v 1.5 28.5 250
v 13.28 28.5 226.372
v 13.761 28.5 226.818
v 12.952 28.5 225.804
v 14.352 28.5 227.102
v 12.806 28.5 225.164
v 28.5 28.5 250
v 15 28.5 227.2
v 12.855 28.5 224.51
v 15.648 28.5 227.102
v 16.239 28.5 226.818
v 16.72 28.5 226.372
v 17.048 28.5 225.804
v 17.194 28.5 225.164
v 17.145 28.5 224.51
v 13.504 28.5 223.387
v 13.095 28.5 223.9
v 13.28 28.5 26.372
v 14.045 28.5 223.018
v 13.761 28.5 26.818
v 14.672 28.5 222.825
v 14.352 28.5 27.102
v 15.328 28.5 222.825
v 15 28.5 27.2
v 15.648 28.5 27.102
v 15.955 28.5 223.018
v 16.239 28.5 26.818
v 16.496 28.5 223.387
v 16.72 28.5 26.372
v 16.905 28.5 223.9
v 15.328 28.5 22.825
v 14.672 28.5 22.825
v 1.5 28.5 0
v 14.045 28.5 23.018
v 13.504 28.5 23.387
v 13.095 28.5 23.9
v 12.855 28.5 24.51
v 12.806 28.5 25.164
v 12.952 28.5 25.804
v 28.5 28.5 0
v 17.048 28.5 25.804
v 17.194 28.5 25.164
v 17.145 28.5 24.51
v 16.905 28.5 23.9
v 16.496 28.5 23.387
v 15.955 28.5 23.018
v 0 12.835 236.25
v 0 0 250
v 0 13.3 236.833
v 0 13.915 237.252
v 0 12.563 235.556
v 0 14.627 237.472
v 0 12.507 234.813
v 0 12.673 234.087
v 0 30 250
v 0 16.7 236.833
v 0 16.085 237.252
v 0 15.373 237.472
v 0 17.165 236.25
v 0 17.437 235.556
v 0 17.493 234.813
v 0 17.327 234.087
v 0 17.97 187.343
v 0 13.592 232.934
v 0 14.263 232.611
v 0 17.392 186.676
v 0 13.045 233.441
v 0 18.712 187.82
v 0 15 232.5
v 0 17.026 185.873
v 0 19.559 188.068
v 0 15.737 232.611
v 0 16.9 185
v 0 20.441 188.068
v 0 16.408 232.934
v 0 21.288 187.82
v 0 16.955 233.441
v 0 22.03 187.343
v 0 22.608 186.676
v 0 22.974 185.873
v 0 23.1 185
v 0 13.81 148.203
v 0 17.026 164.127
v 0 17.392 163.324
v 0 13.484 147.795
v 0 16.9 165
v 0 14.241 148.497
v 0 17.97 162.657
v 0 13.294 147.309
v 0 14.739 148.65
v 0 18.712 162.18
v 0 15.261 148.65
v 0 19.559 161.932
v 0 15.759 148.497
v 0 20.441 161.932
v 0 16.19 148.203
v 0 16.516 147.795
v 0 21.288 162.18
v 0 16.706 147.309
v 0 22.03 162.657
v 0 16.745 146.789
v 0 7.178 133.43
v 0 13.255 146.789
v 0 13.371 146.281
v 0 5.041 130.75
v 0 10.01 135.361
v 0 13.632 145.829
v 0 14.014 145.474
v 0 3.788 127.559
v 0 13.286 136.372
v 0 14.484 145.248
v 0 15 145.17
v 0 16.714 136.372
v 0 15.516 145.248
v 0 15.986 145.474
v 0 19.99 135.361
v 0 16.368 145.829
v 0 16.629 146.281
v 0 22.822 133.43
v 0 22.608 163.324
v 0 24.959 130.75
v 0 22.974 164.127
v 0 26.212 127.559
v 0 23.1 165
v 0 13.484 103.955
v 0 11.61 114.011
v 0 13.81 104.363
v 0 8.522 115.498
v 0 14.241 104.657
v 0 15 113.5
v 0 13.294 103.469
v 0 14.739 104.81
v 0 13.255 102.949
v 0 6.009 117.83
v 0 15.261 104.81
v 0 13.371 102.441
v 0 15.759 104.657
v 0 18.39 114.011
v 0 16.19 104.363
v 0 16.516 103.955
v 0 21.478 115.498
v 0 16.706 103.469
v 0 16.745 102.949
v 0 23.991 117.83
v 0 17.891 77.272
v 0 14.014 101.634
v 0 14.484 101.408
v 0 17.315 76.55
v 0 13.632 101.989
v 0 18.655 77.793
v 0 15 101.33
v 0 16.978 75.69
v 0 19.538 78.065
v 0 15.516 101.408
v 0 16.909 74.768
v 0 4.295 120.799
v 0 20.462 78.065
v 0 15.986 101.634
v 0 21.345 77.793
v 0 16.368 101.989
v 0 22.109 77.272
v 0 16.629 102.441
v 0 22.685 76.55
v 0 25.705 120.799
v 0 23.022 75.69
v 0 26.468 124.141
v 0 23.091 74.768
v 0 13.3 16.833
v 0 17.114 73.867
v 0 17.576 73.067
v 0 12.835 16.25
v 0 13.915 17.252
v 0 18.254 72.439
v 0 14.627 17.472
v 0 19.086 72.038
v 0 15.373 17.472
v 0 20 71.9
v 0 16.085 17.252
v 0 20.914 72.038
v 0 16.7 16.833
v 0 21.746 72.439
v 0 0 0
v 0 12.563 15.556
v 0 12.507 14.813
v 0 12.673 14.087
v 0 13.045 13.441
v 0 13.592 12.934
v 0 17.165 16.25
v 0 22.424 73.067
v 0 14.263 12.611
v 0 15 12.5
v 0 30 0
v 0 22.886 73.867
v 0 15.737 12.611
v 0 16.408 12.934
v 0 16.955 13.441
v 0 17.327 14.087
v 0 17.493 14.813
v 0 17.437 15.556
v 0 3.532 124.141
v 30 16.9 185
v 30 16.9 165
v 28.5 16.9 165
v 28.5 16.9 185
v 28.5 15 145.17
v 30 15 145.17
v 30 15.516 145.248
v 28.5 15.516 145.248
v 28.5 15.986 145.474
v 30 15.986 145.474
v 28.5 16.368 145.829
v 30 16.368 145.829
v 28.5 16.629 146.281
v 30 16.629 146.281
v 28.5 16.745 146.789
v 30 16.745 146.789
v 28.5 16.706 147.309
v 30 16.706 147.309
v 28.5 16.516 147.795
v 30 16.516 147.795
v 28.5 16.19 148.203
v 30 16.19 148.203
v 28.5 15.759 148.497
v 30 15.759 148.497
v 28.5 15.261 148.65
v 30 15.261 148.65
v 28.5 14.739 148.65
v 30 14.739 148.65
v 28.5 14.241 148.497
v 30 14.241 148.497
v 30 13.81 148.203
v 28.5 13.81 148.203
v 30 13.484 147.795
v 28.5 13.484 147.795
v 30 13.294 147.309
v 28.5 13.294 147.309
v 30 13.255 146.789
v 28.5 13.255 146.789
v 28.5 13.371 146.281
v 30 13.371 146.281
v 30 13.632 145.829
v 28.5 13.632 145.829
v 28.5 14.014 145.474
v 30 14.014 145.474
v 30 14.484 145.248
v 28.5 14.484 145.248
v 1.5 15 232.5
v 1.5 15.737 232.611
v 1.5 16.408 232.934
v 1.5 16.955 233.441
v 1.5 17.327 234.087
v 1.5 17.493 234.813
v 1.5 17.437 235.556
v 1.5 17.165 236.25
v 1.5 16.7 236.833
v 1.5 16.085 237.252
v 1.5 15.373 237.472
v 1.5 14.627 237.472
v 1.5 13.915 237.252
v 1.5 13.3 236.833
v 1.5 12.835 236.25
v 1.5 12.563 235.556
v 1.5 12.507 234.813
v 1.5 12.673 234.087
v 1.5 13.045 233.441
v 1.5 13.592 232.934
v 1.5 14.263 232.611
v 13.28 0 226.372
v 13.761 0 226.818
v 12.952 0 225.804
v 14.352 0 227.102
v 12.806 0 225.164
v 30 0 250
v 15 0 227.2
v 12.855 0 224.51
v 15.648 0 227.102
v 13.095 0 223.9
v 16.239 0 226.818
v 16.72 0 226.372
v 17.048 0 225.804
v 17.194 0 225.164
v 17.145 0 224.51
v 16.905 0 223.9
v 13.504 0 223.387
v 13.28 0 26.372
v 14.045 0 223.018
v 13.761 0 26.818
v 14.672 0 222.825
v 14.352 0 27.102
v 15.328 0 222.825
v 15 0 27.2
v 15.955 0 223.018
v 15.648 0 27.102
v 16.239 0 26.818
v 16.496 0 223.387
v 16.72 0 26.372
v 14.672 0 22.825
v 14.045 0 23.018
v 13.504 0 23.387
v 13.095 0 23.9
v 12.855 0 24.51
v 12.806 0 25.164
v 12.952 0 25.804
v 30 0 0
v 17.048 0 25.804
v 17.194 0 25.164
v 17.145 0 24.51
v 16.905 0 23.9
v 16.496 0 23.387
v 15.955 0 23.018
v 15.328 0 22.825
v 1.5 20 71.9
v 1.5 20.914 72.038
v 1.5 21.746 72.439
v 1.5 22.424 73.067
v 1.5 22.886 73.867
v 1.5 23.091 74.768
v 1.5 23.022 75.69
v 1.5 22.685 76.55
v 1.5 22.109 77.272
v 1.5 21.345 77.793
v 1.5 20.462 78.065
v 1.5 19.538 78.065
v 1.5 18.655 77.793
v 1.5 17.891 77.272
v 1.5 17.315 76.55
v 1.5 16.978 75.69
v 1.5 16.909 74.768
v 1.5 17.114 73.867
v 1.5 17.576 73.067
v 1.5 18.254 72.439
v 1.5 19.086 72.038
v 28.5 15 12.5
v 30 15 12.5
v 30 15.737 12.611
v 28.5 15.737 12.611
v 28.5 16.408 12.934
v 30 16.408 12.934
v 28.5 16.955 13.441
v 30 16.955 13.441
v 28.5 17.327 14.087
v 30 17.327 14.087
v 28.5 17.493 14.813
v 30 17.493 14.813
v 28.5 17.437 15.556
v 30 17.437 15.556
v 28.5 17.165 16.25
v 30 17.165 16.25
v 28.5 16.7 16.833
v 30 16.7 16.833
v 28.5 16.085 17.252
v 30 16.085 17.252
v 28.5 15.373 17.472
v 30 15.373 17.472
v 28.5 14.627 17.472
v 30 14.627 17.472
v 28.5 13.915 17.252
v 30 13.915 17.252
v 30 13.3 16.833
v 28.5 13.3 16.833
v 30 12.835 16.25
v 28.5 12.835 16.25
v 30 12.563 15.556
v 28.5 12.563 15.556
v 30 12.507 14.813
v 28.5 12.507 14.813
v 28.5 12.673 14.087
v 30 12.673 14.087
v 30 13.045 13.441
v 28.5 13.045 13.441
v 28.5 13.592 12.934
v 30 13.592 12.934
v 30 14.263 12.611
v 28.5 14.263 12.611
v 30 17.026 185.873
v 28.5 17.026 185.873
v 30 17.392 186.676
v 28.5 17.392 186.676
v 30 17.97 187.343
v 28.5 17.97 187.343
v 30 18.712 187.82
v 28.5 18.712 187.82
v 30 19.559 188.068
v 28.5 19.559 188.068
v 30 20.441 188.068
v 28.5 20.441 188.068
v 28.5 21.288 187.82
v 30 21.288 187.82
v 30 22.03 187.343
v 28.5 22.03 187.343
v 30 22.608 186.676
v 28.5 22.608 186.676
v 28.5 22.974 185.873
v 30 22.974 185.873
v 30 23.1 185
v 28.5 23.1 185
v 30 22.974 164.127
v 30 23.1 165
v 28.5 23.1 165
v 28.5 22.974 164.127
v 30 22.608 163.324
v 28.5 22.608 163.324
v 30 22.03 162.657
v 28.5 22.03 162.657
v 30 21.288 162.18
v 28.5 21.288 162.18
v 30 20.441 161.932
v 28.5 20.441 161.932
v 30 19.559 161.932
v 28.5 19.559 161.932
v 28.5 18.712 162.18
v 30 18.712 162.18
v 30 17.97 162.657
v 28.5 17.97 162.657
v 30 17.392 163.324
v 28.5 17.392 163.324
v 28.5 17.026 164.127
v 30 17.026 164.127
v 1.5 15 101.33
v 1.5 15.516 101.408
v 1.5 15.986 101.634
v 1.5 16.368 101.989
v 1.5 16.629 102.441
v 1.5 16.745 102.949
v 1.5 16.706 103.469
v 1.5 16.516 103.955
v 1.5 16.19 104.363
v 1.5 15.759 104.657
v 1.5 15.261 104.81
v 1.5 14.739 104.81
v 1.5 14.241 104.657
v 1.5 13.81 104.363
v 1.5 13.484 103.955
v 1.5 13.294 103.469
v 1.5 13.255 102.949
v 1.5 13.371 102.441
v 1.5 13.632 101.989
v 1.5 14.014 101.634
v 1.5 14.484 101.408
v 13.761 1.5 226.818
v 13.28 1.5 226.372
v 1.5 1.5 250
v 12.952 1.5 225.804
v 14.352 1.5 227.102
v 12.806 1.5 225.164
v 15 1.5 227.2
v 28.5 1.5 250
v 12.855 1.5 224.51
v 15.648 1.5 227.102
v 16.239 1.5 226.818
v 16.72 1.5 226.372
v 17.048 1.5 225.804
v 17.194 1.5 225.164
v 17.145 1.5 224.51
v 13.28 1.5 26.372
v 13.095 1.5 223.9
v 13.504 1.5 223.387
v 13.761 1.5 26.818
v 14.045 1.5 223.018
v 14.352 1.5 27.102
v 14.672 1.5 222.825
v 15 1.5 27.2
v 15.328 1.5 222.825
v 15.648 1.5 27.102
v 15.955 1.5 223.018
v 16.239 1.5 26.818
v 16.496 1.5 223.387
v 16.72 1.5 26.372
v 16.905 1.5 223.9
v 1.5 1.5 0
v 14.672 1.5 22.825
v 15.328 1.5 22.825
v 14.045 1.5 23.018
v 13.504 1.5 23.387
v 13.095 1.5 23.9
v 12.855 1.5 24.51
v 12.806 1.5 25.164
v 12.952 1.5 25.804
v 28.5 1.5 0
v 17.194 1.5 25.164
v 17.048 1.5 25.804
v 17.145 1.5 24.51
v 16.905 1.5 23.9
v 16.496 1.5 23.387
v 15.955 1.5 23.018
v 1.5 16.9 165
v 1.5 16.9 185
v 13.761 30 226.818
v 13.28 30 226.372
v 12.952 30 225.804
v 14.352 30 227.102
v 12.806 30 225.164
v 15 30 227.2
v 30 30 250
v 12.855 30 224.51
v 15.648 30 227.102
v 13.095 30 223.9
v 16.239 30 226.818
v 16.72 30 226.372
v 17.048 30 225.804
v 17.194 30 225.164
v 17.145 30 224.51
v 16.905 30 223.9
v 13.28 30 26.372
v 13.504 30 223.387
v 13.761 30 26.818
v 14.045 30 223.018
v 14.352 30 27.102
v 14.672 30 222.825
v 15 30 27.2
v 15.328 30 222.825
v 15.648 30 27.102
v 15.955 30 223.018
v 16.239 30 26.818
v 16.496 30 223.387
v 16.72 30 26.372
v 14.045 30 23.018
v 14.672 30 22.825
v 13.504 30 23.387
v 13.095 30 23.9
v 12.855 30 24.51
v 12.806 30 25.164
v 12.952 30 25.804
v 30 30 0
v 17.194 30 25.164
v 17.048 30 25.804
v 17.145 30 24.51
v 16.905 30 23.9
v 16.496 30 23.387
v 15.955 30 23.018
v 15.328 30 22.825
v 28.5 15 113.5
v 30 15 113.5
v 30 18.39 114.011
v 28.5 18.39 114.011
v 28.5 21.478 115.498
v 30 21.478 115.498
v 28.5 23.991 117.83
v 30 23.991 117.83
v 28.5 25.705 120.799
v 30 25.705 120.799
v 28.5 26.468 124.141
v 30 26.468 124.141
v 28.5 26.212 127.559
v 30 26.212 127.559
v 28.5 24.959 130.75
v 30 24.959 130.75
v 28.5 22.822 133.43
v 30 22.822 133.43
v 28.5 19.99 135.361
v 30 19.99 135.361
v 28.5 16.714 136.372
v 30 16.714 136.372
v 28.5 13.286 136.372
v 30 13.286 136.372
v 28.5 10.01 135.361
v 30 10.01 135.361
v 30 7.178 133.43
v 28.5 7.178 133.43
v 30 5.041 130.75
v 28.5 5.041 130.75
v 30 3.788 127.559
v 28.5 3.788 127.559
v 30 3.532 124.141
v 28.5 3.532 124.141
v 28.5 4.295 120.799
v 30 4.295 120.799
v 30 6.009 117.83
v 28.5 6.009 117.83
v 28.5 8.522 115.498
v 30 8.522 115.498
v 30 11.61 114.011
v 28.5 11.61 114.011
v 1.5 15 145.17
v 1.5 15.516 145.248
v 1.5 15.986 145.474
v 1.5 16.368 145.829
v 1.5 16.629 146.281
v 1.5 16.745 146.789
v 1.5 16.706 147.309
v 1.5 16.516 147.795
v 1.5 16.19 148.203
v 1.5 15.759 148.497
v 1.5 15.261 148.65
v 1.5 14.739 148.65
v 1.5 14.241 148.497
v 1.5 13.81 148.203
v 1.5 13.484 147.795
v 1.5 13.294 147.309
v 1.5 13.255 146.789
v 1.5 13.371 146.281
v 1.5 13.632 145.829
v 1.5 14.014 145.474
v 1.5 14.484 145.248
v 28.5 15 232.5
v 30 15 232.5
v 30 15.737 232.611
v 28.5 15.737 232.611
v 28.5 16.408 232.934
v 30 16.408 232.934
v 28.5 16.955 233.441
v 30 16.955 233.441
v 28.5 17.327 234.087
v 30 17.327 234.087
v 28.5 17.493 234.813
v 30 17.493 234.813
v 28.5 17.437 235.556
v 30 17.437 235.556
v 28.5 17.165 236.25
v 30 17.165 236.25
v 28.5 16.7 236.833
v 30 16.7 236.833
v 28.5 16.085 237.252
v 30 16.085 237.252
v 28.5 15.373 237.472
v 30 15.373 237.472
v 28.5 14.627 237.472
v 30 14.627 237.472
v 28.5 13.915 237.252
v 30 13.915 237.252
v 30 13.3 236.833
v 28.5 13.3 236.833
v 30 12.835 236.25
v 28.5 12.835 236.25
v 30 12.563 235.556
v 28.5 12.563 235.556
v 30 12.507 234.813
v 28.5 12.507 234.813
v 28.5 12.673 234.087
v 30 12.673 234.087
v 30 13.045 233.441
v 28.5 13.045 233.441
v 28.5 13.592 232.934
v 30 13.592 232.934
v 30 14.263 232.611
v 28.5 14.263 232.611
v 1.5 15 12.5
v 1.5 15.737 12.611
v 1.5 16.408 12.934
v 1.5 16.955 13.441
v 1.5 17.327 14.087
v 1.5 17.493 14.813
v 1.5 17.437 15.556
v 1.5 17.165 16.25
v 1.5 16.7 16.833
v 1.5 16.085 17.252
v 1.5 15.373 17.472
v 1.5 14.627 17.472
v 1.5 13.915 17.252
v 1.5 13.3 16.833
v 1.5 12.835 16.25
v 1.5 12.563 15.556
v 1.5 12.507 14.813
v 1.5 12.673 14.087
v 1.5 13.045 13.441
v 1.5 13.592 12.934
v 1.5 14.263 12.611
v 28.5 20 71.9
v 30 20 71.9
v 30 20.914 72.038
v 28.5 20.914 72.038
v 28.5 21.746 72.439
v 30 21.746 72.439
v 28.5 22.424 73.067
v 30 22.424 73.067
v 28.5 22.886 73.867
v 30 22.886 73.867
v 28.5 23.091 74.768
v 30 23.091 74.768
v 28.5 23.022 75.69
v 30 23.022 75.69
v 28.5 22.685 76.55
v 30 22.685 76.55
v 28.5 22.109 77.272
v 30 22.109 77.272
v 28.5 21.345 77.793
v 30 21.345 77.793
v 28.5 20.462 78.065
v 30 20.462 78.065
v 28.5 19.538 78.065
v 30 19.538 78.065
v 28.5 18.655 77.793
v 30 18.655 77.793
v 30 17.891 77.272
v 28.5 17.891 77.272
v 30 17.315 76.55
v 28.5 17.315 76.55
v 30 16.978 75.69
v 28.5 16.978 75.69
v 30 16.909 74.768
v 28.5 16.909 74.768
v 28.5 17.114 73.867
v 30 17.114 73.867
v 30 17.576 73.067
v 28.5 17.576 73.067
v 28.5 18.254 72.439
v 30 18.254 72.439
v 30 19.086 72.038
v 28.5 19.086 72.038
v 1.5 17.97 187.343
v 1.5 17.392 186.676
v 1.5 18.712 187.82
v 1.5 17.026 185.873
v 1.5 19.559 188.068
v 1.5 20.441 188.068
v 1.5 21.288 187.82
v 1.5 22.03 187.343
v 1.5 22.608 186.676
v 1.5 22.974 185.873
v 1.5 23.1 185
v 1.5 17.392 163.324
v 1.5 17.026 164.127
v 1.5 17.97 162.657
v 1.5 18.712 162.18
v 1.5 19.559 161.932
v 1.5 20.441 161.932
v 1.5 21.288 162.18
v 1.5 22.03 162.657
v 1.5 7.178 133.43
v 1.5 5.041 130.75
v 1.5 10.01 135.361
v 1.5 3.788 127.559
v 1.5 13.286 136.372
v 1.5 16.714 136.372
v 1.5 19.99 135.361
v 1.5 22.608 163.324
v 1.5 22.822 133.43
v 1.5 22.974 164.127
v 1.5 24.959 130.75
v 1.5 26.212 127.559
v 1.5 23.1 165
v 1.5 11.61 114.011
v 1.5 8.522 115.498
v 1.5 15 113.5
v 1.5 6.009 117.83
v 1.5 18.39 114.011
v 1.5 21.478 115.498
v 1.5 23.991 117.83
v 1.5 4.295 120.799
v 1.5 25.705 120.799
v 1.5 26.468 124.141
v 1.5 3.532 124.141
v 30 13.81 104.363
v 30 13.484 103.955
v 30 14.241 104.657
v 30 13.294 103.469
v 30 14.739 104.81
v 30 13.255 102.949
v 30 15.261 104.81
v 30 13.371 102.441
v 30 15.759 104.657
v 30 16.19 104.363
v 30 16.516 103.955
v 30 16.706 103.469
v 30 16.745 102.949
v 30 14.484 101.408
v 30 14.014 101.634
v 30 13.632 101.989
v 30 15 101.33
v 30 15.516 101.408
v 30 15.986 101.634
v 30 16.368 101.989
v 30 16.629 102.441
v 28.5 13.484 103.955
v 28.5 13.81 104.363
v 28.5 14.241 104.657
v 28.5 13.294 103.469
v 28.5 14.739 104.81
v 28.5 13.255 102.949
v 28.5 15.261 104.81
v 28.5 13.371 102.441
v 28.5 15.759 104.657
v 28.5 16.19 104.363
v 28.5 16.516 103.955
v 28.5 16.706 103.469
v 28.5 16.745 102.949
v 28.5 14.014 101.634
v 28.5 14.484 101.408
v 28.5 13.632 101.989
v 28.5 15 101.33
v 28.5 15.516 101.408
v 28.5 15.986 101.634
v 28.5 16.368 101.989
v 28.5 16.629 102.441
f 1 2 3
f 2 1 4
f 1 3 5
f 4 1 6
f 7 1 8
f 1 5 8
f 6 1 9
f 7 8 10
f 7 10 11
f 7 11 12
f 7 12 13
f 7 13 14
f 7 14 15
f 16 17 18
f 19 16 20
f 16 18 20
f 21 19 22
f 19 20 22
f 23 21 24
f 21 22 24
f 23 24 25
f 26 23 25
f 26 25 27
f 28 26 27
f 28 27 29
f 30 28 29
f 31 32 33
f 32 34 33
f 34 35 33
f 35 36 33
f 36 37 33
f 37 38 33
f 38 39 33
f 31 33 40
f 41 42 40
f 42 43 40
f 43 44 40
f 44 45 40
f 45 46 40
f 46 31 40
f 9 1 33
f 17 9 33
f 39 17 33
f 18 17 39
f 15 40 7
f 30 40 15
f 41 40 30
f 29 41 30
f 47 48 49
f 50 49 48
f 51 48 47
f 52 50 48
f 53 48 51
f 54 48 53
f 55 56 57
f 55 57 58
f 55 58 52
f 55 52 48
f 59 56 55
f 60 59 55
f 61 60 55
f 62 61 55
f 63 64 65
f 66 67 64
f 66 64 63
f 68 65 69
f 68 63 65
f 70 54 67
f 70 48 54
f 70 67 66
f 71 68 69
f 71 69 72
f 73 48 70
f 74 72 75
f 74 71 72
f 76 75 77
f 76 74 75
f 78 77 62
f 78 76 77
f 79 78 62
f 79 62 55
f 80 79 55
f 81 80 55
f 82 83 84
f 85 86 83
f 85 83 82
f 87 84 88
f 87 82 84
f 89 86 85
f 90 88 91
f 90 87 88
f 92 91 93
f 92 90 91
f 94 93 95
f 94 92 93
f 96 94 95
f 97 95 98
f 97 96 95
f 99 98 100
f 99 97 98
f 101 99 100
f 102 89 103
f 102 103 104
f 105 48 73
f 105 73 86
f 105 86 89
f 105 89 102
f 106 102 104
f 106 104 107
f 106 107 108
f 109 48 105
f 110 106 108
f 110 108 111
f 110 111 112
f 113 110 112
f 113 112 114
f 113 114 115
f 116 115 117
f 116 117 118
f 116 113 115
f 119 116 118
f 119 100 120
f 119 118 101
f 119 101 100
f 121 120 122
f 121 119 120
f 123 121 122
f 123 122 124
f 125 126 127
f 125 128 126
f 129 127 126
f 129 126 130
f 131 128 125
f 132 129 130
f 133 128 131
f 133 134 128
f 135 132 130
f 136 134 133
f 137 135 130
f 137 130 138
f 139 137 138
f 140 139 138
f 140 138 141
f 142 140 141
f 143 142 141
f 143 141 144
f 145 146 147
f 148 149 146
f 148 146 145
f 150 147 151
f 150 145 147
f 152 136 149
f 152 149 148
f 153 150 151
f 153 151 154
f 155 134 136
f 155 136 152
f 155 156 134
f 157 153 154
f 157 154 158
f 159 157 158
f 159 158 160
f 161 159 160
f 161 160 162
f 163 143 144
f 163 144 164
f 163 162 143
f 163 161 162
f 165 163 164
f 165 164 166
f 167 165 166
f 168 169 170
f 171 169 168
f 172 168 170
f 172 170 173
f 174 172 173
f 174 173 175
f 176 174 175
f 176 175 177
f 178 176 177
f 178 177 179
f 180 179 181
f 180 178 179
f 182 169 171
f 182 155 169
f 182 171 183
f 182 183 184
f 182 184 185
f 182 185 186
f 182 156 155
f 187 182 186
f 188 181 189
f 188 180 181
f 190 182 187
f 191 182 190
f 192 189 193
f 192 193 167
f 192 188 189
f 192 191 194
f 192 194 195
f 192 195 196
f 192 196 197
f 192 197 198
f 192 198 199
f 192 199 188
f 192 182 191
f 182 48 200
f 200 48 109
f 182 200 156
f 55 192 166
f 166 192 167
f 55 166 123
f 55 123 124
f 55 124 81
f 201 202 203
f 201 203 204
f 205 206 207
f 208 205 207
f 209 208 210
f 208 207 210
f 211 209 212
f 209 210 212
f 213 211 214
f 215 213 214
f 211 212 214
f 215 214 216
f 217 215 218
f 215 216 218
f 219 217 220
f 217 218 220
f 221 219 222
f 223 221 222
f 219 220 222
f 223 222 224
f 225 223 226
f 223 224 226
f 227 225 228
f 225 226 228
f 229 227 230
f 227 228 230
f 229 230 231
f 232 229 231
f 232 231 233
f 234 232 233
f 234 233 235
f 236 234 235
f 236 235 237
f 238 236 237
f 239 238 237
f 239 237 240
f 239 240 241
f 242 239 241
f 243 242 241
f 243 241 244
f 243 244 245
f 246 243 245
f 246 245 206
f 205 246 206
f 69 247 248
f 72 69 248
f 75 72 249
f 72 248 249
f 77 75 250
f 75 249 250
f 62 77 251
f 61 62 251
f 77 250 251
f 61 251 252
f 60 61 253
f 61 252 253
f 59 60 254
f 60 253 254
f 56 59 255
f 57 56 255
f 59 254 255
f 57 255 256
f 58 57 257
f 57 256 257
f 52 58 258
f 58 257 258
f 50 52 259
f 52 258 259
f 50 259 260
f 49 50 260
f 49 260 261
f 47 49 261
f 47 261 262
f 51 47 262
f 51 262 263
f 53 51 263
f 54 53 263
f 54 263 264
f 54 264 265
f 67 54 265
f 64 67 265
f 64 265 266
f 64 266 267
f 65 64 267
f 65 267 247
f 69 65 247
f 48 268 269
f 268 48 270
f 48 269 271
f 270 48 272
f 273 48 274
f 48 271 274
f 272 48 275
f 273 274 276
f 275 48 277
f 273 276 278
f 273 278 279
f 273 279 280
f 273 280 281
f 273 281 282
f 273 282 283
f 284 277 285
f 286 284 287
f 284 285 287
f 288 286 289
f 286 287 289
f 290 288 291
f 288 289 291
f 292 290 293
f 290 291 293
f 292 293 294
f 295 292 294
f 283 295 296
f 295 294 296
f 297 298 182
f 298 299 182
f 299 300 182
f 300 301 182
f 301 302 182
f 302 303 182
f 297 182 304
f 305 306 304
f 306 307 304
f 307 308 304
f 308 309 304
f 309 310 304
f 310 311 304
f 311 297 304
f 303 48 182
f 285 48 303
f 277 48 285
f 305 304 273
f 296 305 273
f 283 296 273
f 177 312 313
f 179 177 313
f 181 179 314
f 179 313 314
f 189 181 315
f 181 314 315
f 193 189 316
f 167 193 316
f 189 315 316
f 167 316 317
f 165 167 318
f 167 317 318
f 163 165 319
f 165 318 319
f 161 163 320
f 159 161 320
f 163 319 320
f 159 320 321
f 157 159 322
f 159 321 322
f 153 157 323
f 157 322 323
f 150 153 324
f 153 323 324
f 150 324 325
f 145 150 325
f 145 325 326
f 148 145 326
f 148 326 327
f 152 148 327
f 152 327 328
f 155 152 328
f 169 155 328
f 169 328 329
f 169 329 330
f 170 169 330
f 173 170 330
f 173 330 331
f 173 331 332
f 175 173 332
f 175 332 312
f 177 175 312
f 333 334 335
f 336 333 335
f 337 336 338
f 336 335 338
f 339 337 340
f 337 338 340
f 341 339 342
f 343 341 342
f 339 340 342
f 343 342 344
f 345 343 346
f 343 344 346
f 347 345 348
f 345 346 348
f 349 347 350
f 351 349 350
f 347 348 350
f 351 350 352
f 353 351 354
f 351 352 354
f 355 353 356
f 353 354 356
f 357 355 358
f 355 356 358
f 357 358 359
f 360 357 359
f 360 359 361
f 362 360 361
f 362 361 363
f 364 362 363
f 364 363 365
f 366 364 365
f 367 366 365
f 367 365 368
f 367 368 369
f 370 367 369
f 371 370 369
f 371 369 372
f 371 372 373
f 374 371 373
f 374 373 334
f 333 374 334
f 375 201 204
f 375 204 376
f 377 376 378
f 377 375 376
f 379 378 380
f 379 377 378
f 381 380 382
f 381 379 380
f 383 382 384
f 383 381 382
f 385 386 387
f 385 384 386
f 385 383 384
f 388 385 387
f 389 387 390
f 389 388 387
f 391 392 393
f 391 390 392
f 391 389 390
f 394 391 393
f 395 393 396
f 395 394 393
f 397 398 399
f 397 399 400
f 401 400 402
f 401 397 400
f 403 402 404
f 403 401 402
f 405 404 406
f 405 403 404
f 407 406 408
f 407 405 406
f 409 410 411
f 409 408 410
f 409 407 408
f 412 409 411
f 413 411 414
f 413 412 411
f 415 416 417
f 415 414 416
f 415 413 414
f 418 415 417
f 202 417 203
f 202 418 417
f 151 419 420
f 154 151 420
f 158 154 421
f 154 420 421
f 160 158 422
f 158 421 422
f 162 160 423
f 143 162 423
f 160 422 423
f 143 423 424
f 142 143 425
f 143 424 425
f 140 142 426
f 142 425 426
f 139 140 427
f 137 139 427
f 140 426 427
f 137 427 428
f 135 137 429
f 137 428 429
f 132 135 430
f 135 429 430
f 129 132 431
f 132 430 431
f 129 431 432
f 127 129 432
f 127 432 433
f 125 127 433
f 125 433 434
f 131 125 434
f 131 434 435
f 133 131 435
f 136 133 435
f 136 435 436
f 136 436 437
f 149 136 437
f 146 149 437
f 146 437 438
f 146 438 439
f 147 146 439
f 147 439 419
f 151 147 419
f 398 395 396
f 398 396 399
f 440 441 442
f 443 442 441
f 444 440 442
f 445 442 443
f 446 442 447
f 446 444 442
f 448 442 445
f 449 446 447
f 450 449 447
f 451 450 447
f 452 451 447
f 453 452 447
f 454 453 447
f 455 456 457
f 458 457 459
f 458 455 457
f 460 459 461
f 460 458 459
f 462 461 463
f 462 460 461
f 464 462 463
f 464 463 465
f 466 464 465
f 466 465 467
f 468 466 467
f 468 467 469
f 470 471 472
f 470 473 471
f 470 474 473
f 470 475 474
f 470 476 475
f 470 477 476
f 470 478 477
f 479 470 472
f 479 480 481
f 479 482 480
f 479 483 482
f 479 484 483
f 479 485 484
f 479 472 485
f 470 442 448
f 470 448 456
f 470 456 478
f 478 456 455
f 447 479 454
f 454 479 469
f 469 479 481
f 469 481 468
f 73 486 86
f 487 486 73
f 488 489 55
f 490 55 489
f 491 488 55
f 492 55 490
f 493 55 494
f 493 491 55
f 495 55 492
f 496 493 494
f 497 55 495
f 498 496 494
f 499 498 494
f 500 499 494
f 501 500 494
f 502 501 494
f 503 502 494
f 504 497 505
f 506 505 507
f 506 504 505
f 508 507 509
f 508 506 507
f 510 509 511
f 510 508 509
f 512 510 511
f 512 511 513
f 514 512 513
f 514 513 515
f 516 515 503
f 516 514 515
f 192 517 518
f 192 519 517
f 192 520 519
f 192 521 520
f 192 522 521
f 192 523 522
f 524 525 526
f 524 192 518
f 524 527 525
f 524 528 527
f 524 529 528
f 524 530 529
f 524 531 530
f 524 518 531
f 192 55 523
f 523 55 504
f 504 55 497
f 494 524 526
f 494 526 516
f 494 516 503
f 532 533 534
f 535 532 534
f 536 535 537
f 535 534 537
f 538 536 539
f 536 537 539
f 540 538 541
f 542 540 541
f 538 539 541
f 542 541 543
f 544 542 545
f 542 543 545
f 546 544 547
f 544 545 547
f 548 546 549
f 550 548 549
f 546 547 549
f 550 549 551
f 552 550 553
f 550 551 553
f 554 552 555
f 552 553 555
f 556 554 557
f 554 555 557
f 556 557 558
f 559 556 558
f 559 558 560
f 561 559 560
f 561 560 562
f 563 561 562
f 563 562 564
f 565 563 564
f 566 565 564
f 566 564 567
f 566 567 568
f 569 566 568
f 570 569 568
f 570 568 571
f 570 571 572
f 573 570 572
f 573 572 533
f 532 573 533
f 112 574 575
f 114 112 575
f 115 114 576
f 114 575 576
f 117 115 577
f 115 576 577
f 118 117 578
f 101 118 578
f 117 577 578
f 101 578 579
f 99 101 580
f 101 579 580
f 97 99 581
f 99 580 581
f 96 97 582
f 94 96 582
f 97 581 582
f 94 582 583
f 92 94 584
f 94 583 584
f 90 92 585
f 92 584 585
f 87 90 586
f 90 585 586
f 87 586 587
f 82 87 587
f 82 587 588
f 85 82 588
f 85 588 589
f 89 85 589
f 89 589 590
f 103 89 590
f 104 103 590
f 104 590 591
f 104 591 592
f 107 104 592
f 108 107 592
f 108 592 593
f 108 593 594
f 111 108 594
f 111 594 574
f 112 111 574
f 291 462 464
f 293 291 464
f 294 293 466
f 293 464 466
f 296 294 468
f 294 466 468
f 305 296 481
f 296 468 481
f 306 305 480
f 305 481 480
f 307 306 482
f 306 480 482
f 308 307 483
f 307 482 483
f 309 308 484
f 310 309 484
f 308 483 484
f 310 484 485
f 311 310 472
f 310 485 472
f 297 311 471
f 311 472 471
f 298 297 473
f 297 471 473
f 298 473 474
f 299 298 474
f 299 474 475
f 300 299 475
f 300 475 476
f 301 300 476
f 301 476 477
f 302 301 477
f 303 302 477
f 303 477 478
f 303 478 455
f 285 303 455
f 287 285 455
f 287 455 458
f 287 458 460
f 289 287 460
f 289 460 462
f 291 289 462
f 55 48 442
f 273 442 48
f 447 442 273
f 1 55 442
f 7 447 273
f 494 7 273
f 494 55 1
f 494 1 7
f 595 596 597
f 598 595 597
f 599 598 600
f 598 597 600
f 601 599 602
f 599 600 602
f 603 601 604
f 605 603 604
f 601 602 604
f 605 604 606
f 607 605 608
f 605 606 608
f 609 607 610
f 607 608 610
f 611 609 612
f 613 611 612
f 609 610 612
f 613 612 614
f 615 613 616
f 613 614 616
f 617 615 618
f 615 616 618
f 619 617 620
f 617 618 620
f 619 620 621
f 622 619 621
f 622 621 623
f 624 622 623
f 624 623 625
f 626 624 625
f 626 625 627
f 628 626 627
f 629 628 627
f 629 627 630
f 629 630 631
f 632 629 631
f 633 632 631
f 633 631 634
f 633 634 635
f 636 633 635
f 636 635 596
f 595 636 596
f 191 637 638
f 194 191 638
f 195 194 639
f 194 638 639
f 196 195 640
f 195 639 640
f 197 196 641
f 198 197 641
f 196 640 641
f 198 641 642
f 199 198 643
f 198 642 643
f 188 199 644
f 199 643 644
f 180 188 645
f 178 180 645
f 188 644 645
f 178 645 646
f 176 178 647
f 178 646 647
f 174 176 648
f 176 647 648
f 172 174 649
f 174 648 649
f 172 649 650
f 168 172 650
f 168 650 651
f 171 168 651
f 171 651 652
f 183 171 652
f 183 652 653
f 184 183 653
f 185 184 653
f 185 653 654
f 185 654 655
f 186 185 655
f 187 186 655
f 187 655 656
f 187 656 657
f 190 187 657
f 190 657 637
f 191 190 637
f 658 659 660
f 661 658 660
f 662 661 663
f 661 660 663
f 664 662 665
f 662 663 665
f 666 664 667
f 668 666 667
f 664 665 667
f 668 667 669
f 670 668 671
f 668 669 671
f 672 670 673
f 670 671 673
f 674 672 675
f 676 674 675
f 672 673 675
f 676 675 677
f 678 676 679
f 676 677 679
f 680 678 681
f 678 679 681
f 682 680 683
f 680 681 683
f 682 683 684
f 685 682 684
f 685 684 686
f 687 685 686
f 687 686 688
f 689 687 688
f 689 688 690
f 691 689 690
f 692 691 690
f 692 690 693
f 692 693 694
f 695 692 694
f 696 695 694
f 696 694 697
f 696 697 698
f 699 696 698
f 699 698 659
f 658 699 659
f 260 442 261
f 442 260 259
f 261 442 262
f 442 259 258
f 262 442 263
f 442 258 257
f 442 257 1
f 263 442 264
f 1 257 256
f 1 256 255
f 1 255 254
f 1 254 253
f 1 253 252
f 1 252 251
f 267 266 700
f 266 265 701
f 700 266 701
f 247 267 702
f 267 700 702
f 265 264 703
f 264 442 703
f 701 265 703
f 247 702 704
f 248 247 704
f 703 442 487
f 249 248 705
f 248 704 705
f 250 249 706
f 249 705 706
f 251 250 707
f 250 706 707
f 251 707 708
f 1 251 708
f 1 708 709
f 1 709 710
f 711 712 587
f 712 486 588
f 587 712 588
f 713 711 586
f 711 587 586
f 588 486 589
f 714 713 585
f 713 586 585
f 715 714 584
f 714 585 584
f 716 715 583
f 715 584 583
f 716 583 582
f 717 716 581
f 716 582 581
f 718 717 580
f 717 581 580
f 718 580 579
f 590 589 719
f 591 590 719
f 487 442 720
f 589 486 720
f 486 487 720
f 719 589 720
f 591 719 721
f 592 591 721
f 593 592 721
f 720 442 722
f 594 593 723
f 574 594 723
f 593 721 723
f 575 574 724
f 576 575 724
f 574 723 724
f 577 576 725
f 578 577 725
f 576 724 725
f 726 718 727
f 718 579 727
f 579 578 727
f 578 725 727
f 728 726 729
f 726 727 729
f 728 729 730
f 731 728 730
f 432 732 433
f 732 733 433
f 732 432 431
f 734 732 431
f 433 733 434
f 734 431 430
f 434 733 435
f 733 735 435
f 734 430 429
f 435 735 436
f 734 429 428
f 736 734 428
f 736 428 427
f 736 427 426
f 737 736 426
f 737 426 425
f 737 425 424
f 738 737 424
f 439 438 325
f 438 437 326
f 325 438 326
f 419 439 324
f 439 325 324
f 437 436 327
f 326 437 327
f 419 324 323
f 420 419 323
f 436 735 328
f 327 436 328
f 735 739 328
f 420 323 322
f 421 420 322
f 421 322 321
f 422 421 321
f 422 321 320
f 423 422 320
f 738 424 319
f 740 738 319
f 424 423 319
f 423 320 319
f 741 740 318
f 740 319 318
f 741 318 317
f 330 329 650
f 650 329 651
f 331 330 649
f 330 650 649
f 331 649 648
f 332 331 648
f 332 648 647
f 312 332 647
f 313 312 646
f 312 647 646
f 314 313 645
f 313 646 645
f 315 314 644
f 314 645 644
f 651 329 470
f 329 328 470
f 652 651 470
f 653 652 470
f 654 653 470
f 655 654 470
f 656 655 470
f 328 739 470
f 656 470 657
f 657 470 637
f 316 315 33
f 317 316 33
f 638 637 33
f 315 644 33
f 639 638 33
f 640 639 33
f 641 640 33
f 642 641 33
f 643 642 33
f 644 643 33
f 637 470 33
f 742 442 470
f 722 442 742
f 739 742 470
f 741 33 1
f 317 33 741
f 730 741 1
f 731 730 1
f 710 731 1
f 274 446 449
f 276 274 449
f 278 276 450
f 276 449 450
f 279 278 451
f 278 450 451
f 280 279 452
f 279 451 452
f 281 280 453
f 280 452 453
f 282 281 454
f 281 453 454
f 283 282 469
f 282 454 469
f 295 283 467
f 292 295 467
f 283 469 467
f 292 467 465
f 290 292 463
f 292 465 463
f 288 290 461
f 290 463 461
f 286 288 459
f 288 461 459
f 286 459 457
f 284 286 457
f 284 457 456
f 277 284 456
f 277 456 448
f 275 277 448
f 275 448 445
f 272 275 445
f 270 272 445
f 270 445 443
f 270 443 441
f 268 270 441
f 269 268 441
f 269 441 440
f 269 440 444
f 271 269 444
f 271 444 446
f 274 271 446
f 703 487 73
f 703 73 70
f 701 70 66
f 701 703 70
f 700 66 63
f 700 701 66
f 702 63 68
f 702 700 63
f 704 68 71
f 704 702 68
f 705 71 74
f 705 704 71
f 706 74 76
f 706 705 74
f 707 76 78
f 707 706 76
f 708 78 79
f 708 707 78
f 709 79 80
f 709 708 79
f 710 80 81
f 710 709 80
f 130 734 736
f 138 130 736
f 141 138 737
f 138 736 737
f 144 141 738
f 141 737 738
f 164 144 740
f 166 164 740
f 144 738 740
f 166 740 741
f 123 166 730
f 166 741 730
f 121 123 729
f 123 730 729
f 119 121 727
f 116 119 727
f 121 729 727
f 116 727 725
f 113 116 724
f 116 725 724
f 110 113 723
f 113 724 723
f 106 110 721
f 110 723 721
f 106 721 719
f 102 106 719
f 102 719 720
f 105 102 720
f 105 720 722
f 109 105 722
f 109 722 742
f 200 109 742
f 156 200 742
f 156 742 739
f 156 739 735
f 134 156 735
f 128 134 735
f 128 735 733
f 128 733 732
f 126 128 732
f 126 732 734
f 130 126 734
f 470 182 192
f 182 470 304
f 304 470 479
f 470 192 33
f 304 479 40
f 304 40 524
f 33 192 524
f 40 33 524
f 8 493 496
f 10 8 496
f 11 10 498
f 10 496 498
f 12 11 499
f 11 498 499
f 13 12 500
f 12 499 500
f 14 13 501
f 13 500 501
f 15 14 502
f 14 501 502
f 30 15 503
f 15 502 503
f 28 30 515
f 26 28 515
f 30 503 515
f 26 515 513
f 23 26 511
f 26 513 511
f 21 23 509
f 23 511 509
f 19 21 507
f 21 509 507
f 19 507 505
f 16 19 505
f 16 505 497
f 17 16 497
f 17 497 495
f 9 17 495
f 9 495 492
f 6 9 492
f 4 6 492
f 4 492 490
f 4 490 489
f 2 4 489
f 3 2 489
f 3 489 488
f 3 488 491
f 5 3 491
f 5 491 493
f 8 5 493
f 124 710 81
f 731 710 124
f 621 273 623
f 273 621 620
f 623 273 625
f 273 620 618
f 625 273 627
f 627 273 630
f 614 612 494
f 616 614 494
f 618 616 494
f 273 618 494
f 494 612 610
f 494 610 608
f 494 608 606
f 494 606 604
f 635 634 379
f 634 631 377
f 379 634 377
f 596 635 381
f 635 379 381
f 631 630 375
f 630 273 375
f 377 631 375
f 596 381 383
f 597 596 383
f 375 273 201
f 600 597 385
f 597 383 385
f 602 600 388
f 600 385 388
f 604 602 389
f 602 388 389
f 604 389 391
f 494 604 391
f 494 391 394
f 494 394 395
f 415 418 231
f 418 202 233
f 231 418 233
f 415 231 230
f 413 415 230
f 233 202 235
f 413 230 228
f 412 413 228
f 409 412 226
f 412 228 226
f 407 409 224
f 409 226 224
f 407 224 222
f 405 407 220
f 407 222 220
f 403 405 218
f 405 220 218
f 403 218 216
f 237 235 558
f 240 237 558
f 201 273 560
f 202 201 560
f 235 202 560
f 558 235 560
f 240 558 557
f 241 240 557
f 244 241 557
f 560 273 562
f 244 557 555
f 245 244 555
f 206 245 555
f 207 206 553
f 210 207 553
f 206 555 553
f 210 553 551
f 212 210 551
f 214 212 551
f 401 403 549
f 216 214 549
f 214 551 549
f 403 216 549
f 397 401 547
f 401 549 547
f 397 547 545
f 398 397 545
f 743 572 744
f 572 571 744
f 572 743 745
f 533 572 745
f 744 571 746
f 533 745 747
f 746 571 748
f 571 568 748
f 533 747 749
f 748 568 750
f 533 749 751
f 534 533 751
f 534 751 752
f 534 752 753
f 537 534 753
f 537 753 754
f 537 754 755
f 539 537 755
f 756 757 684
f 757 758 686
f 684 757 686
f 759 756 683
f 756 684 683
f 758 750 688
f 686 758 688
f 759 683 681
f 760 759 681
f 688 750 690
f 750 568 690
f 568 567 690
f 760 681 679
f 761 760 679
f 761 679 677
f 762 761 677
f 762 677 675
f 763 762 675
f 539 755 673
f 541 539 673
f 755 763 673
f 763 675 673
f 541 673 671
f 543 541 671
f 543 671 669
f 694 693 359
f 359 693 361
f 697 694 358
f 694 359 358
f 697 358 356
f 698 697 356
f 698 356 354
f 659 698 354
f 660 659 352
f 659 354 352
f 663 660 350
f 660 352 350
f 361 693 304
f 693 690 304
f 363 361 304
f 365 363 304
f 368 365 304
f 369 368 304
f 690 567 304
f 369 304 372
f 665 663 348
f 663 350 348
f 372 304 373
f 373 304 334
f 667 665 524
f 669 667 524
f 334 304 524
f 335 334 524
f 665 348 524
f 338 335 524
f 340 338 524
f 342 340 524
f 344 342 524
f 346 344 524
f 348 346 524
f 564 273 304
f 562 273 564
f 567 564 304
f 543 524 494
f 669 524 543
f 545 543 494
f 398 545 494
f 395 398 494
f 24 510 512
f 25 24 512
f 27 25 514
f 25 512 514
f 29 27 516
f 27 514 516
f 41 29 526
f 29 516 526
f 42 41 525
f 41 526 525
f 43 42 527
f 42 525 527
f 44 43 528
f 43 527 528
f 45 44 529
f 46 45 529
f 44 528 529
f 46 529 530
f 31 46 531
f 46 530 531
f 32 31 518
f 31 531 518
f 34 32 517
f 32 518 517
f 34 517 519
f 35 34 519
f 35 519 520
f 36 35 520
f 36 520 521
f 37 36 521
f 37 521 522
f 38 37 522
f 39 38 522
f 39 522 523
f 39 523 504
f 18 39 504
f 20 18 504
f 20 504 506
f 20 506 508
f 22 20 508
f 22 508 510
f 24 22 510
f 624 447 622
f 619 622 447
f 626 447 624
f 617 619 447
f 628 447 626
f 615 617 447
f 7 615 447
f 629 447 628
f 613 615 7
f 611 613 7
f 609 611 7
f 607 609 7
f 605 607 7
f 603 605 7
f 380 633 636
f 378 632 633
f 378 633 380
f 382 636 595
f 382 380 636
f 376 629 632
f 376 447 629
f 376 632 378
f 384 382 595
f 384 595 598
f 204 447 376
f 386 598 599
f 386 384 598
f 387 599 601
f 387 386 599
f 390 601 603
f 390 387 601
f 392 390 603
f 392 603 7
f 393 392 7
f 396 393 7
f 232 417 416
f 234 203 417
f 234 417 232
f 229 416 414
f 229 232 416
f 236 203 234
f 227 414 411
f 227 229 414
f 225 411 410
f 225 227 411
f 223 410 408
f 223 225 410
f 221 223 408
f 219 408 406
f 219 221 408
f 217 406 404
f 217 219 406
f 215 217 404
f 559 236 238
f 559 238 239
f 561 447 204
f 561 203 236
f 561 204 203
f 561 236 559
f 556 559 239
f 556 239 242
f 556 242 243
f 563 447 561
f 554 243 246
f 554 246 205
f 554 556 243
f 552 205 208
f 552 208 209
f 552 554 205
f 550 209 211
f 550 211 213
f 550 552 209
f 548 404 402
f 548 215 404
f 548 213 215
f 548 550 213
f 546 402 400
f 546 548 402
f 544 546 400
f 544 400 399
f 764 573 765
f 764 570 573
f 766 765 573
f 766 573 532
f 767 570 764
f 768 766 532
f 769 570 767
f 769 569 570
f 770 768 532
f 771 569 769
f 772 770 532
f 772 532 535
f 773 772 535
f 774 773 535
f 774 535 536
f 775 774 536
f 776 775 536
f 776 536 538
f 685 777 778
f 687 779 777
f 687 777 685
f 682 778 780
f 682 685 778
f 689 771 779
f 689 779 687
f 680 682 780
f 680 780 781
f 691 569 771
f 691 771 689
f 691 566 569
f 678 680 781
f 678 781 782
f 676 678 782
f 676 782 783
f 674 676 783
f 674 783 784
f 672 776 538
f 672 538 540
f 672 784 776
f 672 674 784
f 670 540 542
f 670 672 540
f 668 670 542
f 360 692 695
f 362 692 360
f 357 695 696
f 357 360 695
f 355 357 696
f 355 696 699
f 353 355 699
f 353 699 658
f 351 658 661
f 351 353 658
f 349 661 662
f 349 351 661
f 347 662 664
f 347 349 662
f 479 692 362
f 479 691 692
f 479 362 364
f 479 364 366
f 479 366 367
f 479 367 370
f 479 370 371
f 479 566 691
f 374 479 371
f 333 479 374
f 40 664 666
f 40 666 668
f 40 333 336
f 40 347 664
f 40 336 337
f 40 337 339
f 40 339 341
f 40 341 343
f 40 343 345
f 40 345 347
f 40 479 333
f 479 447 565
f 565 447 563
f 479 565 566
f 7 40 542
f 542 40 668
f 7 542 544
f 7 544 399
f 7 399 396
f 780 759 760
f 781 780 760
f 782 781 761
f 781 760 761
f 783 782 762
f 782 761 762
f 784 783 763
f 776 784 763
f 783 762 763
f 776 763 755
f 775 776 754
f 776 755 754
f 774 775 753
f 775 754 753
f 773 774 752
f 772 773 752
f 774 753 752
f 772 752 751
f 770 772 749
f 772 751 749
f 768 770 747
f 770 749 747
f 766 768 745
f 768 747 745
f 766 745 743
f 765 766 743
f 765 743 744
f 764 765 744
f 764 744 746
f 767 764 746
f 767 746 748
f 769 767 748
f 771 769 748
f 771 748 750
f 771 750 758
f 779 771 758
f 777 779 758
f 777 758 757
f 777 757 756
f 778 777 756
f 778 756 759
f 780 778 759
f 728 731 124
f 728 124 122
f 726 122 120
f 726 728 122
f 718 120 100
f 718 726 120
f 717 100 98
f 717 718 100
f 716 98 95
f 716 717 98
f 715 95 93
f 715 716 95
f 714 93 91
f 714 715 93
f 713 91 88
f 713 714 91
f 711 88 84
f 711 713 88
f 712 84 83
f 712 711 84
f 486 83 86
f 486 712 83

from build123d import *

# Parameters (mm, degrees)
SKETCH1_W           = 30
SKETCH1_H           = 30
SKETCH1_W_2         = 27
SKETCH1_H_2         = 27
BOSS_EXTRUDE1_DEPTH = 250
SKETCH2_R           = 3.1
SKETCH2_R_2         = 2.5
SKETCH2_R_3         = 11.5
SKETCH2_R_4         = 1.75
CUT_EXTRUDE1_DEPTH  = 254.574446662
SKETCH3_R           = 2.2
CUT_EXTRUDE2_DEPTH  = 254.574446662


with BuildPart() as part:
    # Sketch1 → Boss-Extrude1 (new body)
    with BuildSketch(Plane.XY):
        with Locations((15, 15)):
            Rectangle(SKETCH1_W, SKETCH1_H)
        with Locations((15, 15)):
            Rectangle(SKETCH1_W_2, SKETCH1_H_2, mode=Mode.SUBTRACT)
    extrude(amount=BOSS_EXTRUDE1_DEPTH)

    # Sketch2 → Cut-Extrude1 (cut, through all)
    with BuildSketch(Plane(origin=(30, 0, 0), x_dir=(0, 0, -1), z_dir=(1, 0, 0))):
        with Locations((-75, 20)):
            Circle(SKETCH2_R)
        with Locations((-15, 15)):
            Circle(SKETCH2_R_2)
        with Locations((-235, 15)):
            Circle(SKETCH2_R_2)
        with Locations((-125, 15)):
            Circle(SKETCH2_R_3)
        with Locations((-146.92, 15)):
            Circle(SKETCH2_R_4)
        with Locations((-103.08, 15)):
            Circle(SKETCH2_R_4)
        with BuildLine():
            Line((-185, 23.1), (-165, 23.1))
            ThreePointArc((-165, 23.1), (-161.9, 20), (-165, 16.9))
            Line((-165, 16.9), (-185, 16.9))
            ThreePointArc((-185, 16.9), (-188.1, 20), (-185, 23.1))
        make_face()
    extrude(amount=-CUT_EXTRUDE1_DEPTH, mode=Mode.SUBTRACT)

    # Sketch3 → Cut-Extrude2 (cut, through all)
    with BuildSketch(Plane(origin=(0, 30, 0), x_dir=(1, 0, 0), z_dir=(0, 1, 0))):
        with Locations(Location((15, -25, 0), (0, 0, 270))):
            Circle(SKETCH3_R)
        with Locations(Location((15, -225, 0), (0, 0, 270))):
            Circle(SKETCH3_R)
    extrude(amount=-CUT_EXTRUDE2_DEPTH, mode=Mode.SUBTRACT)


solid = part.part
